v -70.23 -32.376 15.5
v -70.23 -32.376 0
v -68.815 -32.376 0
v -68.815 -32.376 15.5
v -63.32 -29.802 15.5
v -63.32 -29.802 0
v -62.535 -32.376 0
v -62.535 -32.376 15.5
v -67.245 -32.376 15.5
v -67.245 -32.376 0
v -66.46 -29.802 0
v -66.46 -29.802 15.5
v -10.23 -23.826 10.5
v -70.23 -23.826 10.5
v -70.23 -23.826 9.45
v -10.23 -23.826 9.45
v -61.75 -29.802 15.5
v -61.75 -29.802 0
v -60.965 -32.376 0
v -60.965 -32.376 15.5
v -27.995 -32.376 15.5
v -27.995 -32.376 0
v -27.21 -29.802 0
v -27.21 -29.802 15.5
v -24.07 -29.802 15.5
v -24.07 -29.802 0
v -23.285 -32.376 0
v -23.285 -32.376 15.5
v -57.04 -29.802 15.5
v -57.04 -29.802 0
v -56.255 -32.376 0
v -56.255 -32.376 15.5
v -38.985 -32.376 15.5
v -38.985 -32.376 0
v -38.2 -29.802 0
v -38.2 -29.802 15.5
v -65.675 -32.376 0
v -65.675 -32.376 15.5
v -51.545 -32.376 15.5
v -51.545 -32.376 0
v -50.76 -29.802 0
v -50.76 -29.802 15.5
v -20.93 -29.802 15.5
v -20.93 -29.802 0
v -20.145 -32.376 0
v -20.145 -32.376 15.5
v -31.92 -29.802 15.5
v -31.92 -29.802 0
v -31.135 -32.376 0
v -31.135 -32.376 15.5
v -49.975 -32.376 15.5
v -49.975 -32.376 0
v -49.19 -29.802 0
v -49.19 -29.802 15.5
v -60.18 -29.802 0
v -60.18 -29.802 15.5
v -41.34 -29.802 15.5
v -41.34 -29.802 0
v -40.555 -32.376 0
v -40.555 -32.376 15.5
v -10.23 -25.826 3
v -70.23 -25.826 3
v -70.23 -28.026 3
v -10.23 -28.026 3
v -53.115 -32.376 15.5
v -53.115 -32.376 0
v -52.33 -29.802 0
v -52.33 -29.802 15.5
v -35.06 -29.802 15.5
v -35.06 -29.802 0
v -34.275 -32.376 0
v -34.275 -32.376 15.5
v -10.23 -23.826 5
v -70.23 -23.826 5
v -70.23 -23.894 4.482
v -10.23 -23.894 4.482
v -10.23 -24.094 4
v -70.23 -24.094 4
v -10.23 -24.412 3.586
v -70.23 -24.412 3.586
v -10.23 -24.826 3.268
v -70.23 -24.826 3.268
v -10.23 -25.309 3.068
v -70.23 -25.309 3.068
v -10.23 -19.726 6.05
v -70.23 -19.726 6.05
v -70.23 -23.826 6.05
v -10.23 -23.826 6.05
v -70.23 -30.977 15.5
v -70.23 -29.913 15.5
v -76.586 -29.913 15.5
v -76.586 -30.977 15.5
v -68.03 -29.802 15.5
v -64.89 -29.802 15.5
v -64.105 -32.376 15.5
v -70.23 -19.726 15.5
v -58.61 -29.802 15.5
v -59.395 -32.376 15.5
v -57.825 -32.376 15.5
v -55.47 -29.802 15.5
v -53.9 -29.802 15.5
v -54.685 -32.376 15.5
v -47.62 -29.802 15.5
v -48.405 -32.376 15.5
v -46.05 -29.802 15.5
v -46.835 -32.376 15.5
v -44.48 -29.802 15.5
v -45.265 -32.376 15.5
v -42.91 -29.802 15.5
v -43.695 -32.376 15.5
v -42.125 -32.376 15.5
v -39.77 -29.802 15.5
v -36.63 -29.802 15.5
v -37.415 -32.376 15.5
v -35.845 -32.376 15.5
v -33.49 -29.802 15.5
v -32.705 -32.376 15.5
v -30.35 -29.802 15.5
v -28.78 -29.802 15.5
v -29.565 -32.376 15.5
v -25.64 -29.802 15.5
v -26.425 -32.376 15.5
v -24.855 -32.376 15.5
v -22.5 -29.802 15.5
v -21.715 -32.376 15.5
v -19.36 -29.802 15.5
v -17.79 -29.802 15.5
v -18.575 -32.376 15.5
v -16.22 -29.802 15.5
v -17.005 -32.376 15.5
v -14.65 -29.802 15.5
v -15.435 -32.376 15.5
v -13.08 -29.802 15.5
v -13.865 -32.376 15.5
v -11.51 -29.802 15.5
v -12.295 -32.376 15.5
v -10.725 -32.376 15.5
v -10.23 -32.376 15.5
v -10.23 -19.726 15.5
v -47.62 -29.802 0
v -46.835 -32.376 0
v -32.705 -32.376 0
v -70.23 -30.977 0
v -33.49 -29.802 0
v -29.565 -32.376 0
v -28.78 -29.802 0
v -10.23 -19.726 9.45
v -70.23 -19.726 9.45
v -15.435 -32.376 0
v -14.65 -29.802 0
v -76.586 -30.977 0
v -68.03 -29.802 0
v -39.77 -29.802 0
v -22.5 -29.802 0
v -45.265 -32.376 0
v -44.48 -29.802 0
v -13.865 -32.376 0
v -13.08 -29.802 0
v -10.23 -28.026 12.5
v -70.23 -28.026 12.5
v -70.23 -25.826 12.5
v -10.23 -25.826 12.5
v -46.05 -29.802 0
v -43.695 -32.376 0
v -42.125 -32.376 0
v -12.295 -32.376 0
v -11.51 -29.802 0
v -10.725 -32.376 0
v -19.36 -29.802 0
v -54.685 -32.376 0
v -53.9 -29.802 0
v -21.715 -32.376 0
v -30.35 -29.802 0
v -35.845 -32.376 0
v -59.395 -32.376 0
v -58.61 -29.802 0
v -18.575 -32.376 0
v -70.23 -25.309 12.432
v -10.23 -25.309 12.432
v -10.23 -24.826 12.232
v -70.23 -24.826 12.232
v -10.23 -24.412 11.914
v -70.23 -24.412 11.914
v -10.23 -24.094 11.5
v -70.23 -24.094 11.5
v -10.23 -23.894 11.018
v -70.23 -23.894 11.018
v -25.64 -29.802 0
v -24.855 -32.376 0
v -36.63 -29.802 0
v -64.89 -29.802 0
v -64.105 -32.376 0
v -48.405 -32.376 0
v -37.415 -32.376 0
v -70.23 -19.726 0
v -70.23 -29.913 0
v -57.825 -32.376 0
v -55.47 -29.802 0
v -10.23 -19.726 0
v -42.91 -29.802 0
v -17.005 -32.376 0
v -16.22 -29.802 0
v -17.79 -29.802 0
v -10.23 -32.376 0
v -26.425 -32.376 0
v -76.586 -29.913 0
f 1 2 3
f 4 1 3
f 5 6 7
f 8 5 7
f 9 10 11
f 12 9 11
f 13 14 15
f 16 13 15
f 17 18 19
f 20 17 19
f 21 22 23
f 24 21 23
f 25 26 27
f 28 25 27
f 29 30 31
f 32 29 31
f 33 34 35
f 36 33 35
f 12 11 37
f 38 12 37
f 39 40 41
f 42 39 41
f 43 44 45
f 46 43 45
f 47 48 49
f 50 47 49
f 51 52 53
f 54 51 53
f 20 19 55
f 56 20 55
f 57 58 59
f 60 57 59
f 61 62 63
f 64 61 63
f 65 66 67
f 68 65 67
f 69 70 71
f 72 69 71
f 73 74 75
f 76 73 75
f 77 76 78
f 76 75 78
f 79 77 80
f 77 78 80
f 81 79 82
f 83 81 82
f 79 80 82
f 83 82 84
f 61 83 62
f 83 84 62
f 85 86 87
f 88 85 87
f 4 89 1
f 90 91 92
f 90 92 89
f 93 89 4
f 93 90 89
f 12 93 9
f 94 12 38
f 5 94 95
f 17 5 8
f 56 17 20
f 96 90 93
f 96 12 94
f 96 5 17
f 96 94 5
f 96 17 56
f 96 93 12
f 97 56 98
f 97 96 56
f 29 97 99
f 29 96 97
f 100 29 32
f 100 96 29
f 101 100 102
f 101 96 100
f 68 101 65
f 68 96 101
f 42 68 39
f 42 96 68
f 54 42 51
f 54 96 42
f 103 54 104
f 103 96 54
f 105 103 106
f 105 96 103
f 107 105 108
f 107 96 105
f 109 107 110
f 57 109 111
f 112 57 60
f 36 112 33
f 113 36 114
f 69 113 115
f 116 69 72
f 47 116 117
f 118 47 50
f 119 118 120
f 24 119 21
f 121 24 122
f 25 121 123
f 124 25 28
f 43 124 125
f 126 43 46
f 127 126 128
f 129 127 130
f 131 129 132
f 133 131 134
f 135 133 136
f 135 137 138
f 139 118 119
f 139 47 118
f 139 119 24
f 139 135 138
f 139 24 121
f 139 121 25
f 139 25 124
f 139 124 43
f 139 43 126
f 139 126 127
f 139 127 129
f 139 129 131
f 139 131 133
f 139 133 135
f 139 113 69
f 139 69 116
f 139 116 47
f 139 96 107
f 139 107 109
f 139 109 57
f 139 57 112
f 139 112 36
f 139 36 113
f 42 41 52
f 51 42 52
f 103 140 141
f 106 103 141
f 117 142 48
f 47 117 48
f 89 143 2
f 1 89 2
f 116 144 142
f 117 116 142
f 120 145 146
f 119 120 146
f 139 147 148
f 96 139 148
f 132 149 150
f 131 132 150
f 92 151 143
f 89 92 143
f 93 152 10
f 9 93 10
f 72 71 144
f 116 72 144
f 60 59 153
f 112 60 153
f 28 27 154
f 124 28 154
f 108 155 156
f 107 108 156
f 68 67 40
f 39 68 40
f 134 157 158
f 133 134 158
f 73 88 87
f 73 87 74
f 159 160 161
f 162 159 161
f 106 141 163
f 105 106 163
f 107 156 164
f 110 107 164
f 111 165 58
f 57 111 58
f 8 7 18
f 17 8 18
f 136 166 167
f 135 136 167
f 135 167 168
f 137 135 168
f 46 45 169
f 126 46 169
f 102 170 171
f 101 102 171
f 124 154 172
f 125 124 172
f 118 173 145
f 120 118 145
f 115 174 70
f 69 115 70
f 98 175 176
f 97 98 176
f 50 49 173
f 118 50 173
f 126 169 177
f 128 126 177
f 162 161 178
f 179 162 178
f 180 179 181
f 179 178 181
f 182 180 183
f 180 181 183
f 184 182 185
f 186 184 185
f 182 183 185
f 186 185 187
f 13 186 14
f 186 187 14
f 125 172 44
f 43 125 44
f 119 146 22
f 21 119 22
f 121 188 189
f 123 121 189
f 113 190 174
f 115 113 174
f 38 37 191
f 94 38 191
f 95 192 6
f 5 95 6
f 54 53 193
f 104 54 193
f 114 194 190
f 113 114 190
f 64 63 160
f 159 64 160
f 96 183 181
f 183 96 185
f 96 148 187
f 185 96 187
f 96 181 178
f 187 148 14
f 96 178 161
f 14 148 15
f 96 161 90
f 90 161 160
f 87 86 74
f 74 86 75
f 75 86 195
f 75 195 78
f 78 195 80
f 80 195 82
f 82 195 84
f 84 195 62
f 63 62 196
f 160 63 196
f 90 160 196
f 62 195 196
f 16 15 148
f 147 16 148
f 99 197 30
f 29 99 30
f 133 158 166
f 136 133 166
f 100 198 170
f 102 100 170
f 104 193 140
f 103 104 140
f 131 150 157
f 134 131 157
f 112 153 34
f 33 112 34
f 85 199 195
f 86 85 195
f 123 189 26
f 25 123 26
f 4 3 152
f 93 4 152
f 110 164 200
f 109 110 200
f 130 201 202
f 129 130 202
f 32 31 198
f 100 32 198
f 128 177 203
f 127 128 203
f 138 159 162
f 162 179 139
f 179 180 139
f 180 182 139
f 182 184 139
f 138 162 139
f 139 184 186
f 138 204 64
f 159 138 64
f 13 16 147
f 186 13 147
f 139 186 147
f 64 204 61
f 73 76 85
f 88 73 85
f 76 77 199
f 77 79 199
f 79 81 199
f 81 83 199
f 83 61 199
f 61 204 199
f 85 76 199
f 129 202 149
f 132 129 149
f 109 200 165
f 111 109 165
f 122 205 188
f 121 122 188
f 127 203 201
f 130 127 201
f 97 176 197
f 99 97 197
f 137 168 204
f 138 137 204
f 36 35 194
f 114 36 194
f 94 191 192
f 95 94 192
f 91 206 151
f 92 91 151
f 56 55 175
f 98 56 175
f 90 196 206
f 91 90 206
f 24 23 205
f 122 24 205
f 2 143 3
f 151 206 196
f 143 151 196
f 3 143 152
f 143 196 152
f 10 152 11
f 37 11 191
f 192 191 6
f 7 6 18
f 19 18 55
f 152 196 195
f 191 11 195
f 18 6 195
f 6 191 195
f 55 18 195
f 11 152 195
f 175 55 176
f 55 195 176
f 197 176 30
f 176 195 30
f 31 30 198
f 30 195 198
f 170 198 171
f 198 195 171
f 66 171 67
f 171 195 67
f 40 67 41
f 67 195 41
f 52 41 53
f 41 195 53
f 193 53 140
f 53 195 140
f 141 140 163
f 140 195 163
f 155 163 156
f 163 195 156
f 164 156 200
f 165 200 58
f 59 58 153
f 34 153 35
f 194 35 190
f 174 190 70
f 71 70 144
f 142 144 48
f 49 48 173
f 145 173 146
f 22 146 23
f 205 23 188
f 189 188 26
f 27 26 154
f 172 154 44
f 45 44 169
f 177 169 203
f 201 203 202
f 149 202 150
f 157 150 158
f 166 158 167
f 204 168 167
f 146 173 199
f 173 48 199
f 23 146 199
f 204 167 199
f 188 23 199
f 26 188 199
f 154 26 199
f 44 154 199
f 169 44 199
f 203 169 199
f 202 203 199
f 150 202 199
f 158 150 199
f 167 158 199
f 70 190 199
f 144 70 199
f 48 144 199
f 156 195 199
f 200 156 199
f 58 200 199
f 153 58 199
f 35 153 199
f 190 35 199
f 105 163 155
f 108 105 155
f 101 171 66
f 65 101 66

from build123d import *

# Parameters (mm, degrees)
BOSS_EXTRUDE1_DEPTH = 15.5
CUT_EXTRUDE1_DEPTH  = 81.5


with BuildPart() as part:
    # Sketch1 → Boss-Extrude1 (new body)
    with BuildSketch(Plane.XY):
        Polygon((-10.229681979, -19.726325088), (-70.229681979, -19.726325088), (-70.229681979, -29.913296732), (-76.585734932, -29.913296732), (-76.585734932, -30.976616664), (-70.229681979, -30.976616664), (-70.229681979, -32.376325088), (-68.814681979, -32.376325088), (-68.029681979, -29.801896387), (-67.244681979, -32.376325088), (-66.459681979, -29.801896387), (-65.674681979, -32.376325088), (-64.889681979, -29.801896387), (-64.104681979, -32.376325088), (-63.319681979, -29.801896387), (-62.534681979, -32.376325088), (-61.749681979, -29.801896387), (-60.964681979, -32.376325088), (-60.179681979, -29.801896387), (-59.394681979, -32.376325088), (-58.609681979, -29.801896387), (-57.824681979, -32.376325088), (-57.039681979, -29.801896387), (-56.254681979, -32.376325088), (-55.469681979, -29.801896387), (-54.684681979, -32.376325088), (-53.899681979, -29.801896387), (-53.114681979, -32.376325088), (-52.329681979, -29.801896387), (-51.544681979, -32.376325088), (-50.759681979, -29.801896387), (-49.974681979, -32.376325088), (-49.189681979, -29.801896387), (-48.404681979, -32.376325088), (-47.619681979, -29.801896387), (-46.834681979, -32.376325088), (-46.049681979, -29.801896387), (-45.264681979, -32.376325088), (-44.479681979, -29.801896387), (-43.694681979, -32.376325088), (-42.909681979, -29.801896387), (-42.124681979, -32.376325088), (-41.339681979, -29.801896387), (-40.554681979, -32.376325088), (-39.769681979, -29.801896387), (-38.984681979, -32.376325088), (-38.199681979, -29.801896387), (-37.414681979, -32.376325088), (-36.629681979, -29.801896387), (-35.844681979, -32.376325088), (-35.059681979, -29.801896387), (-34.274681979, -32.376325088), (-33.489681979, -29.801896387), (-32.704681979, -32.376325088), (-31.919681979, -29.801896387), (-31.134681979, -32.376325088), (-30.349681979, -29.801896387), (-29.564681979, -32.376325088), (-28.779681979, -29.801896387), (-27.994681979, -32.376325088), (-27.209681979, -29.801896387), (-26.424681979, -32.376325088), (-25.639681979, -29.801896387), (-24.854681979, -32.376325088), (-24.069681979, -29.801896387), (-23.284681979, -32.376325088), (-22.499681979, -29.801896387), (-21.714681979, -32.376325088), (-20.929681979, -29.801896387), (-20.144681979, -32.376325088), (-19.359681979, -29.801896387), (-18.574681979, -32.376325088), (-17.789681979, -29.801896387), (-17.004681979, -32.376325088), (-16.219681979, -29.801896387), (-15.434681979, -32.376325088), (-14.649681979, -29.801896387), (-13.864681979, -32.376325088), (-13.079681979, -29.801896387), (-12.294681979, -32.376325088), (-11.509681979, -29.801896387), (-10.724681979, -32.376325088), (-10.229681979, -32.376325088), align=None)
    extrude(amount=BOSS_EXTRUDE1_DEPTH)

    # Sketch2 → Cut-Extrude1 (cut)
    with BuildSketch(Plane.ZY.offset(70.229681979)):
        with BuildLine():
            Line((6.05, -23.826325088), (5, -23.826325088))
            ThreePointArc((5, -23.826325088), (3.585786438, -24.412111526), (3, -25.826325088))
            Line((3, -25.826325088), (3, -28.026325088))
            Line((3, -28.026325088), (12.5, -28.026325088))
            Line((12.5, -28.026325088), (12.5, -25.826325088))
            ThreePointArc((12.5, -25.826325088), (11.914213562, -24.412111526), (10.5, -23.826325088))
            Line((10.5, -23.826325088), (9.45, -23.826325088))
            Line((9.45, -23.826325088), (9.45, -19.726325088))
            Line((9.45, -19.726325088), (6.05, -19.726325088))
            Line((6.05, -19.726325088), (6.05, -23.826325088))
        make_face()
    extrude(amount=-CUT_EXTRUDE1_DEPTH, mode=Mode.SUBTRACT)


solid = part.part
